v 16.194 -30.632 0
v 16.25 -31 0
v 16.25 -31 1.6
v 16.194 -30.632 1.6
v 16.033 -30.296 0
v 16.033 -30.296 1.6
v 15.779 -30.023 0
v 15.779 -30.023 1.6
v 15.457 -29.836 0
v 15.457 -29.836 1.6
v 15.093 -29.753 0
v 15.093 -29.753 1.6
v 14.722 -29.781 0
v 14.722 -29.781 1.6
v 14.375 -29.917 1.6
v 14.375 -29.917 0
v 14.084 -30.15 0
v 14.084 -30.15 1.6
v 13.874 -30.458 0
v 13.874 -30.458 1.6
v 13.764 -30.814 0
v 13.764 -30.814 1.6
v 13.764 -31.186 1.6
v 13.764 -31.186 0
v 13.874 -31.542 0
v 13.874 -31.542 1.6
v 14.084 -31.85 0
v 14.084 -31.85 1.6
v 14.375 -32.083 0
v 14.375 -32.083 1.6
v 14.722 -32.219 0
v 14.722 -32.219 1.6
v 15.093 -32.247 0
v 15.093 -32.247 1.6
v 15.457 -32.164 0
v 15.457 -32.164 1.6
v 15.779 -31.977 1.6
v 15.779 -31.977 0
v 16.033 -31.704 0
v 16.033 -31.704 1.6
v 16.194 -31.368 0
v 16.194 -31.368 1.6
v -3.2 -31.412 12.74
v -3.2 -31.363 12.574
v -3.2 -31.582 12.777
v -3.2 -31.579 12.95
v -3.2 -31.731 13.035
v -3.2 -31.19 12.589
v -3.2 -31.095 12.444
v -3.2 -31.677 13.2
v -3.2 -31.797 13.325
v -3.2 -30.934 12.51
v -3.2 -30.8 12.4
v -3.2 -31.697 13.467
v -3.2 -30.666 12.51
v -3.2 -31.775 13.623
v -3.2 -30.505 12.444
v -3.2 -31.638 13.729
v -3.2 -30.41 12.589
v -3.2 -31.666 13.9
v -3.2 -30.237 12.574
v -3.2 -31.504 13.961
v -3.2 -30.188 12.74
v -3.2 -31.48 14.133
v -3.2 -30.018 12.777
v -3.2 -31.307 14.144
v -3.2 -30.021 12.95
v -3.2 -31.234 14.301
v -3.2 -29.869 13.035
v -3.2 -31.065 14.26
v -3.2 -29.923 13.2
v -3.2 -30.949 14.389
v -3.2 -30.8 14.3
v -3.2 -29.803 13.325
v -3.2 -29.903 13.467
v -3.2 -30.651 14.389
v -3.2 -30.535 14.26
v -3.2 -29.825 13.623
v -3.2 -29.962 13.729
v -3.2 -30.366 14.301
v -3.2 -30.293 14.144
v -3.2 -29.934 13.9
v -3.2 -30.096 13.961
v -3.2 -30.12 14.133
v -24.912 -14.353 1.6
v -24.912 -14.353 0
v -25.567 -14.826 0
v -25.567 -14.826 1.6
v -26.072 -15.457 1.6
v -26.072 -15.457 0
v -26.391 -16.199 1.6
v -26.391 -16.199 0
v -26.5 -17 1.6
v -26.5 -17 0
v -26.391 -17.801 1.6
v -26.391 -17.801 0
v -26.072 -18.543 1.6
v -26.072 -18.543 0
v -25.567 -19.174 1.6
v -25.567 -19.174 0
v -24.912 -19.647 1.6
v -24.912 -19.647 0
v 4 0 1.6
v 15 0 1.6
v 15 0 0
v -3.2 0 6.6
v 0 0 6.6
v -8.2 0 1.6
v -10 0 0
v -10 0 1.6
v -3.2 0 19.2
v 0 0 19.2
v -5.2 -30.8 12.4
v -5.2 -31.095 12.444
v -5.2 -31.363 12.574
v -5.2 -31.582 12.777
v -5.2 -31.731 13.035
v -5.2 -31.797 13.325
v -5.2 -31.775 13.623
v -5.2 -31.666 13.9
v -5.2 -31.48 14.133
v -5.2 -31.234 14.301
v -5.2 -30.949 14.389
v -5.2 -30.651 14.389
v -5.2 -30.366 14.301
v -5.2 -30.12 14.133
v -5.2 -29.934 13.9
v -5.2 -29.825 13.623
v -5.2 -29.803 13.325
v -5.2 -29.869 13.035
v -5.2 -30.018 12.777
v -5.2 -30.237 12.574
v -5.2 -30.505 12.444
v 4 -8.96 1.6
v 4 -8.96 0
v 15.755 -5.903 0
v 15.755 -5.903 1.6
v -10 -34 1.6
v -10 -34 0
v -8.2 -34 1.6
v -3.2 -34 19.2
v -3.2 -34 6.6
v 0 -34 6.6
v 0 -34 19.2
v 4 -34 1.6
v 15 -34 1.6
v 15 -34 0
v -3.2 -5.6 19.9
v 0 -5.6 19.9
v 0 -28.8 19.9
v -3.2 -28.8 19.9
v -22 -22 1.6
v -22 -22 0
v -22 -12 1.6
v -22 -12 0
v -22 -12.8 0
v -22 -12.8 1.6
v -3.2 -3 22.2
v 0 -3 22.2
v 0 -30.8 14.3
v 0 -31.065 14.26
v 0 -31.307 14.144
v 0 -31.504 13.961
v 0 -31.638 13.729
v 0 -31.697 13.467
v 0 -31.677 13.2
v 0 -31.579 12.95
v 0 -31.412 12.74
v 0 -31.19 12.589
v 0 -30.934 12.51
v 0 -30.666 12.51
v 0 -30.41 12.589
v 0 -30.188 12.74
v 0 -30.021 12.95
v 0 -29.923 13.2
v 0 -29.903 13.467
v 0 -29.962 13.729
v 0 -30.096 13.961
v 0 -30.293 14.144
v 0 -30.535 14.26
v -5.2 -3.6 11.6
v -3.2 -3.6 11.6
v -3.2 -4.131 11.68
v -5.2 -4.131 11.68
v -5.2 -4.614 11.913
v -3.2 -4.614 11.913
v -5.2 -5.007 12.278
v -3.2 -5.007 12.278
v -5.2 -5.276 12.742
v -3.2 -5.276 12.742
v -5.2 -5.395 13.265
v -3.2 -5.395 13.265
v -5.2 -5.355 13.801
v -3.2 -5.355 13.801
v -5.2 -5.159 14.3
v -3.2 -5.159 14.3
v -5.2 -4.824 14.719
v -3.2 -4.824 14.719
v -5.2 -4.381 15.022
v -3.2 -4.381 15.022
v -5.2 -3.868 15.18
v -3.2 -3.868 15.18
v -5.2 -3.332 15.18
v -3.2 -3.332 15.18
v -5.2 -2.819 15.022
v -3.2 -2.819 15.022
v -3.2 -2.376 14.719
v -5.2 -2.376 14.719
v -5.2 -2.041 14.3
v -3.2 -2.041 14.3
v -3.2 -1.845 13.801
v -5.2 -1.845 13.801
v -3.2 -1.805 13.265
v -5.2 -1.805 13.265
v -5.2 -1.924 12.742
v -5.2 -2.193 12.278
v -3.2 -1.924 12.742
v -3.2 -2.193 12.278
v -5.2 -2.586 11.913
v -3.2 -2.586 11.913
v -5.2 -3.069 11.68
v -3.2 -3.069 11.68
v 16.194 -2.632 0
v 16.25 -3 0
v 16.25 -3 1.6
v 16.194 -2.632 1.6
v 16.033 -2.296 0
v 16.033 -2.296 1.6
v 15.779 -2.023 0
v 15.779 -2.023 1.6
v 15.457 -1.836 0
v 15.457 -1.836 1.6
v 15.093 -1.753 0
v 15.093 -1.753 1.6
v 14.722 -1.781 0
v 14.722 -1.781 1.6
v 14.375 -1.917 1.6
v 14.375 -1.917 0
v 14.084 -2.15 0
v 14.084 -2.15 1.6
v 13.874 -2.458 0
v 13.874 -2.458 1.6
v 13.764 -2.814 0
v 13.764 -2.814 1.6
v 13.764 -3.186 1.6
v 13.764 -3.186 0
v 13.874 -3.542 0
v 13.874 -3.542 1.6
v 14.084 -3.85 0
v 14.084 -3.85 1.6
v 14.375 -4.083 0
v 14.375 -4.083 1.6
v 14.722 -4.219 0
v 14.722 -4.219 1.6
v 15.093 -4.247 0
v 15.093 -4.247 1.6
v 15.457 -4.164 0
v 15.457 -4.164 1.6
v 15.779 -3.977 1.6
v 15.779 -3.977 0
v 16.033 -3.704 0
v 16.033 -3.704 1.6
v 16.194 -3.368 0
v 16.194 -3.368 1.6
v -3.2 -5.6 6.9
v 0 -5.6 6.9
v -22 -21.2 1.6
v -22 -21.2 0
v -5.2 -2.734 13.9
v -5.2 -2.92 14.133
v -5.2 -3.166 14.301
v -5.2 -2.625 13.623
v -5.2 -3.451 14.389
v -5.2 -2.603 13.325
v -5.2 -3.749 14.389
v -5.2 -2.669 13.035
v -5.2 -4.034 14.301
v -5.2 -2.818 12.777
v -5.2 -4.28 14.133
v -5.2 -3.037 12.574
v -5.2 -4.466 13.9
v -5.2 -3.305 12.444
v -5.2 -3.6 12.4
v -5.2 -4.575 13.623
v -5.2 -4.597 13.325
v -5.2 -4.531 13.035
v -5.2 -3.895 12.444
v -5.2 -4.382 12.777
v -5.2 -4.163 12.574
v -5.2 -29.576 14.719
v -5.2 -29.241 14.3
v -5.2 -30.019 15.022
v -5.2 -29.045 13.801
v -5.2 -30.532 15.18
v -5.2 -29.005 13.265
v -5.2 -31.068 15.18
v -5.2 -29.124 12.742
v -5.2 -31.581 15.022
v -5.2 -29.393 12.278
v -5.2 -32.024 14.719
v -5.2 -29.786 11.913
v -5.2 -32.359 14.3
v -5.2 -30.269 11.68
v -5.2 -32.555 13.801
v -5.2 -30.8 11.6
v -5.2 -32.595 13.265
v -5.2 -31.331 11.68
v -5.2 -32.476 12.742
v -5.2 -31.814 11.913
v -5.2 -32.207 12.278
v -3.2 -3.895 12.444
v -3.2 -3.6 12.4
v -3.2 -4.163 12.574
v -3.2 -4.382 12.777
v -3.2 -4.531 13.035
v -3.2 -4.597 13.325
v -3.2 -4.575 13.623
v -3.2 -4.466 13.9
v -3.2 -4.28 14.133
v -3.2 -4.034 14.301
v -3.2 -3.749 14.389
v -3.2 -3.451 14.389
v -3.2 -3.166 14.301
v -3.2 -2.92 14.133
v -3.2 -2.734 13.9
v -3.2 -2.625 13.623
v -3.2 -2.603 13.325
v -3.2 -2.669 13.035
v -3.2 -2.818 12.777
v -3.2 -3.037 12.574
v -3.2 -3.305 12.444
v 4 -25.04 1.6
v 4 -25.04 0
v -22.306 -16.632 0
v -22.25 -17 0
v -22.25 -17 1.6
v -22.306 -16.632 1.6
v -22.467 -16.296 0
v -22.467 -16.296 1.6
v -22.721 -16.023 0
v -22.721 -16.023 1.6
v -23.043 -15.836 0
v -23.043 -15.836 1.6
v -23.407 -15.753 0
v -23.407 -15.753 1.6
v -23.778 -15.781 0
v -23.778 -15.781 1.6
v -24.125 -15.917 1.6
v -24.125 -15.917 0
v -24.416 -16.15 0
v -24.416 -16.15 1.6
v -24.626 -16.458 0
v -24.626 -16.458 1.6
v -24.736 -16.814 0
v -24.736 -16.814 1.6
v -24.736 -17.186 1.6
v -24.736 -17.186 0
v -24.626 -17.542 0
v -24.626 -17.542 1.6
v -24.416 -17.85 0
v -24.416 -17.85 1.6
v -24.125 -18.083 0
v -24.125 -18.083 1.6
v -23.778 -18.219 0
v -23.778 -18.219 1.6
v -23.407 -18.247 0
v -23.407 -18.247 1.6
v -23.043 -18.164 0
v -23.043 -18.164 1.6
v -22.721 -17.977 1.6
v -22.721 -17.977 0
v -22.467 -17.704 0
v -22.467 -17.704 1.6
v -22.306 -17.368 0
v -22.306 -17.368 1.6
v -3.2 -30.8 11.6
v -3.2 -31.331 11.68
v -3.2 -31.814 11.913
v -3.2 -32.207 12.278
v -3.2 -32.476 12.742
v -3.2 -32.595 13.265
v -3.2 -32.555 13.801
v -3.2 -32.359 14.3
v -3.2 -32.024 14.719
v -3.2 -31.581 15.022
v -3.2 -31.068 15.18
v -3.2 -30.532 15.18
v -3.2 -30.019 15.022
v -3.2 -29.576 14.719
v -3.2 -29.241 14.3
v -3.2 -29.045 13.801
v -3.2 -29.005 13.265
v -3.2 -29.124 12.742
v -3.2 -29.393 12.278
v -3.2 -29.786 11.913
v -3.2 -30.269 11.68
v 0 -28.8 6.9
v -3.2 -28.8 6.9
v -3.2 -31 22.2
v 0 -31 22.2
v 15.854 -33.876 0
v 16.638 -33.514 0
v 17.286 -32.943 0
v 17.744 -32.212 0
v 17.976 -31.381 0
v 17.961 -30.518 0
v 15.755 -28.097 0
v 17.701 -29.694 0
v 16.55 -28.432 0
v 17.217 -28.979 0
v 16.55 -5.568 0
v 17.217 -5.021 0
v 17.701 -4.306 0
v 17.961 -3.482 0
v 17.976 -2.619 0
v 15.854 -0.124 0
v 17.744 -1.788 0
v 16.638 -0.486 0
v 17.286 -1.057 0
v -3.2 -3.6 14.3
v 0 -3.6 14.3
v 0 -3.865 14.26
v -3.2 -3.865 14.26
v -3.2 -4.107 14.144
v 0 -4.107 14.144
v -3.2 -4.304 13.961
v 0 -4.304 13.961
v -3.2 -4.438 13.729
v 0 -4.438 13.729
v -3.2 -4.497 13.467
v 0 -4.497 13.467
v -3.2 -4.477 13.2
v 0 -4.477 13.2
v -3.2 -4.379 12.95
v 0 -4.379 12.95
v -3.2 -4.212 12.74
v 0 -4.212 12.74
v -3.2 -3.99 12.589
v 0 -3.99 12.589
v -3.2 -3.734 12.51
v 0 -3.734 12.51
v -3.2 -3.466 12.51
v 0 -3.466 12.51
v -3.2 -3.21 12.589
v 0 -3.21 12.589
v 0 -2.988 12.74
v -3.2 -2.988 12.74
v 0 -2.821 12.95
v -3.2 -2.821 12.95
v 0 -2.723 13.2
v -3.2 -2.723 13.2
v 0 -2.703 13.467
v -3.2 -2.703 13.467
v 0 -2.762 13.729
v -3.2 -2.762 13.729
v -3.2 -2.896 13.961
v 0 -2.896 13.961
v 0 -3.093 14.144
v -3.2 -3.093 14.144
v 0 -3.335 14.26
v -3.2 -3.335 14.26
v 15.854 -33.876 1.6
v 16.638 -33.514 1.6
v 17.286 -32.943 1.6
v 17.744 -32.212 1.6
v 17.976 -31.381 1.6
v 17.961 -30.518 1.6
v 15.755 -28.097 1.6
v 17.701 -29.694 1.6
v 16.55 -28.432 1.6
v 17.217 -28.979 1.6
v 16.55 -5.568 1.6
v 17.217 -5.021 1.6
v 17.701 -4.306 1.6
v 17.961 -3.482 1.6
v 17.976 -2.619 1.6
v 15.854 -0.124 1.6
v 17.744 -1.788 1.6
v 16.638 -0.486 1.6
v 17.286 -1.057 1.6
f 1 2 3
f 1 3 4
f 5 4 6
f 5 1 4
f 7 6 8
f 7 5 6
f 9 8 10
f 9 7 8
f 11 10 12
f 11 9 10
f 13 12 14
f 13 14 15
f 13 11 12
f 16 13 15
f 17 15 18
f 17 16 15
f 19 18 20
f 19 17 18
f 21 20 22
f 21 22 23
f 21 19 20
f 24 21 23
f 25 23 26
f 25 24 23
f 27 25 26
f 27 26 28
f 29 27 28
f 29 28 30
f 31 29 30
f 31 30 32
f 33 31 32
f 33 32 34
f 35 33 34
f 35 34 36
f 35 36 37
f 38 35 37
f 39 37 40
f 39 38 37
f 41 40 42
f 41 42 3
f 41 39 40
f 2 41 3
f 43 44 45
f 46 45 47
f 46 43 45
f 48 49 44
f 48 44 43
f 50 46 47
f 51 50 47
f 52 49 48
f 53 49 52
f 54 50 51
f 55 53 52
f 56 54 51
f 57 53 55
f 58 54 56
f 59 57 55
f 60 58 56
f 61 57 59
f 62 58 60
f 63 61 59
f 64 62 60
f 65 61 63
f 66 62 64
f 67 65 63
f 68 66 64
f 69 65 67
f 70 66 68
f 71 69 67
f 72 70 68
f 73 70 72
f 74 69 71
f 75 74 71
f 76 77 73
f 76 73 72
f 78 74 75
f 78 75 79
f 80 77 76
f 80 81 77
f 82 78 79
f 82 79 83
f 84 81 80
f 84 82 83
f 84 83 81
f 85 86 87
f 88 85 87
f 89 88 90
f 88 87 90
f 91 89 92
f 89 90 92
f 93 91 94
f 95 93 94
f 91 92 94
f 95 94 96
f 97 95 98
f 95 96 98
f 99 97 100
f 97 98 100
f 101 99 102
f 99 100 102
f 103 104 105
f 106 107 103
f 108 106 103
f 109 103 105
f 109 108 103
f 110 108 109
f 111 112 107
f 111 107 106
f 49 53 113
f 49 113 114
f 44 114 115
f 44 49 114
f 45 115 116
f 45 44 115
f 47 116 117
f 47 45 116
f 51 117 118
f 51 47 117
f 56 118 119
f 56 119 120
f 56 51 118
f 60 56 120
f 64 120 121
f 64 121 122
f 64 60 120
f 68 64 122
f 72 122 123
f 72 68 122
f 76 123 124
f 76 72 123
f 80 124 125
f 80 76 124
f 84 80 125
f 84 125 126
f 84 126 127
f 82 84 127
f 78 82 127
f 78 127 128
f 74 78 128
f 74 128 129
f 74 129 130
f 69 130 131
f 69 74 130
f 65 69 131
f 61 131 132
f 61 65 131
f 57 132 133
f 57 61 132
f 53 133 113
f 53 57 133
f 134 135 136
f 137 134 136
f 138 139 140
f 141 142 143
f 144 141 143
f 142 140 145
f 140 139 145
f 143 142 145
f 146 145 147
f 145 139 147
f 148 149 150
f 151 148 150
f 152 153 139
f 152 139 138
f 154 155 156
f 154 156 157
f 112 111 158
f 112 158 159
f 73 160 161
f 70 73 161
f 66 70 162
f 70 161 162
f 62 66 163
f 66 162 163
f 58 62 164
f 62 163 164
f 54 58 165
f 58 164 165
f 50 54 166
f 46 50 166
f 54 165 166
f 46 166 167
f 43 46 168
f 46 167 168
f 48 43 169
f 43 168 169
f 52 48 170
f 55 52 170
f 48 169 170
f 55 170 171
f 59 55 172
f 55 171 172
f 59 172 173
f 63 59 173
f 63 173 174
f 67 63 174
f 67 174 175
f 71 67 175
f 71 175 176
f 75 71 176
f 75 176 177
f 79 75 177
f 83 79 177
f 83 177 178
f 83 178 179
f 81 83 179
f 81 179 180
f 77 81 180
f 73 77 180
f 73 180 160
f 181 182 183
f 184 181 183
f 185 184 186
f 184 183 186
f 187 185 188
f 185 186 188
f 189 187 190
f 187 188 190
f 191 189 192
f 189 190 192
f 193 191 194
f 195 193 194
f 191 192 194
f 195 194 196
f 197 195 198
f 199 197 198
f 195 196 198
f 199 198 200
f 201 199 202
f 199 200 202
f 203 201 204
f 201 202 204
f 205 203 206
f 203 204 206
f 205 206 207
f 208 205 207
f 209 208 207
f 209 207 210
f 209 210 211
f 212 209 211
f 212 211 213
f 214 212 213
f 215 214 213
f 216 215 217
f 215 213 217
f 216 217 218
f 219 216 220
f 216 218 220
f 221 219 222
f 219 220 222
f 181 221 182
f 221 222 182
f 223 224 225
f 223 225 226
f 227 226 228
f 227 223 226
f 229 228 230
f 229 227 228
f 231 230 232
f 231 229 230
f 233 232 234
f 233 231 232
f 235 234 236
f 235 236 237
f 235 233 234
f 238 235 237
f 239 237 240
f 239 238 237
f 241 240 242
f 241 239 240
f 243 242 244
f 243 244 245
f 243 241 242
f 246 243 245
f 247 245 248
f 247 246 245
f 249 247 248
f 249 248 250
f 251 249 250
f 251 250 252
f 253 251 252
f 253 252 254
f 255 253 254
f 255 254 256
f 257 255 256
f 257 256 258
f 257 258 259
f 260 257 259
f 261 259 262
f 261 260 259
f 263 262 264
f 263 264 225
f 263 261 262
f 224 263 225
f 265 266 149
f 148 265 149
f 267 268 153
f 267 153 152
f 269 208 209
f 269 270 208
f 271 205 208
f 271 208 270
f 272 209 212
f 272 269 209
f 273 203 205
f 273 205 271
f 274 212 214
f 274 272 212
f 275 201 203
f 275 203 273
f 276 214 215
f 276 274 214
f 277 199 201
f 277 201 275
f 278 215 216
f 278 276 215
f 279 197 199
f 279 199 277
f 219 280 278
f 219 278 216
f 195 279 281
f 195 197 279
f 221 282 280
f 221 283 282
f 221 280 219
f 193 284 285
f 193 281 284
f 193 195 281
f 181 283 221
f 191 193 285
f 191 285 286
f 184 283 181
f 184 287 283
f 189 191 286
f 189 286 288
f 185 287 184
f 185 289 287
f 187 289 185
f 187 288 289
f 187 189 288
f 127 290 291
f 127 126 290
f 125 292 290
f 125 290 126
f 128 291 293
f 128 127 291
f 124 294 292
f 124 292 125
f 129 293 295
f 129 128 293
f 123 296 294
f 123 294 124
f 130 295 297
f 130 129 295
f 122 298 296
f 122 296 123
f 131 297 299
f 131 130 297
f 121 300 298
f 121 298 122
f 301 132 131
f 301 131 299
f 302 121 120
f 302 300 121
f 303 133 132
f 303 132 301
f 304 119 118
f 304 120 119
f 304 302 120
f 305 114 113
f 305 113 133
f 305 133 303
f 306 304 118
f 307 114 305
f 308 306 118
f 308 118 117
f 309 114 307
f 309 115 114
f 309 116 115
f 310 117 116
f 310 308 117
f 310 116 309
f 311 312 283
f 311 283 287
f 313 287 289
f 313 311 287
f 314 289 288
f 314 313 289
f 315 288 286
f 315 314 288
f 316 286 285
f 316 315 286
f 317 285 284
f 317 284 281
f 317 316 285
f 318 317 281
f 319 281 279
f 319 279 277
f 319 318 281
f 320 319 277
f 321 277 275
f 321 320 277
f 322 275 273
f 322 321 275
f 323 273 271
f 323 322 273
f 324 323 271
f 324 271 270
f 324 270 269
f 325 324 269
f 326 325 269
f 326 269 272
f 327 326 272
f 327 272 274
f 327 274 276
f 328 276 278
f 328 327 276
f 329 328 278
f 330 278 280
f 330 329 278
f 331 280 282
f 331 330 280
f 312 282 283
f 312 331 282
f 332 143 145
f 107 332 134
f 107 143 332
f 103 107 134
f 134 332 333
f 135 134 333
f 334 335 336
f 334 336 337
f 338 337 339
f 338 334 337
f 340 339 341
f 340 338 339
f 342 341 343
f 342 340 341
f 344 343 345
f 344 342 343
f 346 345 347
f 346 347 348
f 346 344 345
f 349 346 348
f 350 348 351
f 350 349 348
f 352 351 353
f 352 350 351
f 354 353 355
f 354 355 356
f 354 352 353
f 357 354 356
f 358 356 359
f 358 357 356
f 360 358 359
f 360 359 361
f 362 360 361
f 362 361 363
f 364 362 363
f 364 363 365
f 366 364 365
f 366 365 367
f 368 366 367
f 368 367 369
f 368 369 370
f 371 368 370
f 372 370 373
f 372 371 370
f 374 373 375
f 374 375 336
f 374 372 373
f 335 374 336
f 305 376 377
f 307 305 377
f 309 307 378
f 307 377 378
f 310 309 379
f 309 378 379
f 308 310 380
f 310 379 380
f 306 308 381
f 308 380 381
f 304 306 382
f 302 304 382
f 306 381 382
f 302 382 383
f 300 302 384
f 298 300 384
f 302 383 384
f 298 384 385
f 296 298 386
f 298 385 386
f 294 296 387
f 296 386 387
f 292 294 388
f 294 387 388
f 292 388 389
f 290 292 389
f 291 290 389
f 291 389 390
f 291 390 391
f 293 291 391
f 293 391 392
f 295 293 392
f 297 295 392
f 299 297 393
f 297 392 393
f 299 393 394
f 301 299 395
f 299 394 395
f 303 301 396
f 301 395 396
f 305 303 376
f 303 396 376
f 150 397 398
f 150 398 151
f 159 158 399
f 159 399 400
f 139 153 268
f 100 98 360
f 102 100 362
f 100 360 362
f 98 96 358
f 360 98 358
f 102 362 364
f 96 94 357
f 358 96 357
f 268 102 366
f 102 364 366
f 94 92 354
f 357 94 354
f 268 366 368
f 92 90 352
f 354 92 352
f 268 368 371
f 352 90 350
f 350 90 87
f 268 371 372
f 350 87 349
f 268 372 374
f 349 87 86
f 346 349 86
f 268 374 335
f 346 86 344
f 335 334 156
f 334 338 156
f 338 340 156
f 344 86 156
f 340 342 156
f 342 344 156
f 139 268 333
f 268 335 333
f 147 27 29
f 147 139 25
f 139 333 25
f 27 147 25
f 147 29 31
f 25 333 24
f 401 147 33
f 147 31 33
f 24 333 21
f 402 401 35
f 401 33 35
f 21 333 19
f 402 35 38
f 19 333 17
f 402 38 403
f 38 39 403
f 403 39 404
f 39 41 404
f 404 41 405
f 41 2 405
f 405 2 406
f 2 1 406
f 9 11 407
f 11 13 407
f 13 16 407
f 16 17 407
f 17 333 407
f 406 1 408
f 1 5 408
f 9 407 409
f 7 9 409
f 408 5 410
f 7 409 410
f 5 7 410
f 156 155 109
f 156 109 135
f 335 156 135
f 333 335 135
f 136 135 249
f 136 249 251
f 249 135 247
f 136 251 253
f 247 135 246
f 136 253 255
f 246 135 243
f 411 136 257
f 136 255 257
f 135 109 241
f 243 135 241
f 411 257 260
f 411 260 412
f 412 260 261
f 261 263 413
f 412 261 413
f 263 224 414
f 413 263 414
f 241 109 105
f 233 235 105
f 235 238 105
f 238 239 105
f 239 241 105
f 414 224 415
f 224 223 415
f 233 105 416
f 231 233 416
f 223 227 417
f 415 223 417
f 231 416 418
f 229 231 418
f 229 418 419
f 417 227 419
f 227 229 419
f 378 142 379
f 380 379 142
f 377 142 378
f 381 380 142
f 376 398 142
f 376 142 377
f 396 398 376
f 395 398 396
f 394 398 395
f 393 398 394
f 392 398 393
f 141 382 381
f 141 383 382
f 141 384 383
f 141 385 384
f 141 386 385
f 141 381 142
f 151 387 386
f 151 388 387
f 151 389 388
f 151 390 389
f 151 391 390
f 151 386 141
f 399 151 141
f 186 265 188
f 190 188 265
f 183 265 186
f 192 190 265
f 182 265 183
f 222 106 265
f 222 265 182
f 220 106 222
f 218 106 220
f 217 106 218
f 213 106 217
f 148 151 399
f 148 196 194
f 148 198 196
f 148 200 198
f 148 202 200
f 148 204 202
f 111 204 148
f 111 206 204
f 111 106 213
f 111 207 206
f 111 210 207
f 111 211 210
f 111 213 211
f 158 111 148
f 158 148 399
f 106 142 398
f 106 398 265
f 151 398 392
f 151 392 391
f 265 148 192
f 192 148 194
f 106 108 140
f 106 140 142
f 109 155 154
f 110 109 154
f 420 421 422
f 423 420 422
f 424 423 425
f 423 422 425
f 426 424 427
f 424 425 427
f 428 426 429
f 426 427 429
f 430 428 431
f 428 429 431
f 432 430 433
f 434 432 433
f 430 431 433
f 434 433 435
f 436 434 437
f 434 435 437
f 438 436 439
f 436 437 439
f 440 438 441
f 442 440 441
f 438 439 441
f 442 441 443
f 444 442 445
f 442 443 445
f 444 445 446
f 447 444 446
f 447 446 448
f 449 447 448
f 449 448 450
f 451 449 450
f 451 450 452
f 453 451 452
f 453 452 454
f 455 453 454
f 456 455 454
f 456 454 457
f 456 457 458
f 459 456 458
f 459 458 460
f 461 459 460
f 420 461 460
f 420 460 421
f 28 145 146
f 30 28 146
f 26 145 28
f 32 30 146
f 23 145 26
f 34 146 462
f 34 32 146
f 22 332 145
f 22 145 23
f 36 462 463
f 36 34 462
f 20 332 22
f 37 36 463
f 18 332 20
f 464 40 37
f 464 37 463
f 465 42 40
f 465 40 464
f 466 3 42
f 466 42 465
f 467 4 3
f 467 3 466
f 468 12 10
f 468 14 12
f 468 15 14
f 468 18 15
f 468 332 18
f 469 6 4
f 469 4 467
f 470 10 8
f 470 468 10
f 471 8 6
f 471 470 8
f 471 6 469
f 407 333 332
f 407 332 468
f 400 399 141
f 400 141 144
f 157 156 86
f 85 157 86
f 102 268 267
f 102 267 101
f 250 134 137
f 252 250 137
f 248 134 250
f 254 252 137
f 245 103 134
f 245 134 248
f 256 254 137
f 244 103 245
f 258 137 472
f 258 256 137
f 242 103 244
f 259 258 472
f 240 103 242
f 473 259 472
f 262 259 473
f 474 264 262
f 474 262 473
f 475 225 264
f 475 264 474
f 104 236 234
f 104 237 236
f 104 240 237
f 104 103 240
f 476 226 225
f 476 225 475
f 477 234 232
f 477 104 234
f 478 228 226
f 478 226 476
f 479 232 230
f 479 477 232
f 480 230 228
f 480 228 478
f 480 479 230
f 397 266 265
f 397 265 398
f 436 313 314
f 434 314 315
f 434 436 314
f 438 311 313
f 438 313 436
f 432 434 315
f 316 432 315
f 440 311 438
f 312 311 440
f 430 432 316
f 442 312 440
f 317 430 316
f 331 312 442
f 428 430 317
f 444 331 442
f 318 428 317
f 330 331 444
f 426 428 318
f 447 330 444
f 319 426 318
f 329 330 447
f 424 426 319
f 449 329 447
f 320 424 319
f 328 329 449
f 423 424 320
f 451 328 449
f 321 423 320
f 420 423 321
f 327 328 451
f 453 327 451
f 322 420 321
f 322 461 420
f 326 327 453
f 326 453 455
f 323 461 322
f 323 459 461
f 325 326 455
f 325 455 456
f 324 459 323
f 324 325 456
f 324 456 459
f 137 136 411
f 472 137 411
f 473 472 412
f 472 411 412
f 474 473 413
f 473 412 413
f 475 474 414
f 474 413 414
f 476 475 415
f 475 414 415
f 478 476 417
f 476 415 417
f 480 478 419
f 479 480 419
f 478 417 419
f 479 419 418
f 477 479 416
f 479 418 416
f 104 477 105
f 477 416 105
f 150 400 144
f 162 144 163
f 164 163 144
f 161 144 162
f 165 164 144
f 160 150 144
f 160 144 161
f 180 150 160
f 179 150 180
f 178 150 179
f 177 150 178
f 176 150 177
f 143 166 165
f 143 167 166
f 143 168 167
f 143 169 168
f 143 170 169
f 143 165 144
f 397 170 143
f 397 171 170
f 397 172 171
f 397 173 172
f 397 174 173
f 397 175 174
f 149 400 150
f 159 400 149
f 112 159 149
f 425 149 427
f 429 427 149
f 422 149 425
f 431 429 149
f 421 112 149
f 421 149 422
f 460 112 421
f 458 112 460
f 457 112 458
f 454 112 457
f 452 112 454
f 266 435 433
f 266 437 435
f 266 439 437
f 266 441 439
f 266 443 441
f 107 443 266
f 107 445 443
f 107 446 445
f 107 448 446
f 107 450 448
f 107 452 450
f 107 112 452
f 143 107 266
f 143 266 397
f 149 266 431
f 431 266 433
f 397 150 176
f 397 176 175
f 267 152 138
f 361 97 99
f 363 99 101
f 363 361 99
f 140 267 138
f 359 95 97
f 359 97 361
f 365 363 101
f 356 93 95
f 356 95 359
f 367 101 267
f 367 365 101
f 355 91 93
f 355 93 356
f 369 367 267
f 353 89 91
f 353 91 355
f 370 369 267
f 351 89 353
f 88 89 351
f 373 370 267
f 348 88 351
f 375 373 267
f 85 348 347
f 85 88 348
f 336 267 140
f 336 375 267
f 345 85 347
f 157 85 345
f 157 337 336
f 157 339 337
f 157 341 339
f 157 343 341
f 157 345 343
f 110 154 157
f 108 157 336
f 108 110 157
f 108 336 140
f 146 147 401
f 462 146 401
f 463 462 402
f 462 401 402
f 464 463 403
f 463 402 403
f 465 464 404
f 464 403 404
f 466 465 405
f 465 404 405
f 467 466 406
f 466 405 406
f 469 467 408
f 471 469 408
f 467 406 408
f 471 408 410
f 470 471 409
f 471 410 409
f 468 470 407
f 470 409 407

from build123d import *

# Parameters (mm, degrees)
PAD_DEPTH       = 34
SKETCH_R        = 0.9
POCKET_DEPTH    = 22.001
SKETCH003_W     = 13
SKETCH003_H     = 23.2
POCKET001_DEPTH = 22.001
SKETCH005_R     = 1.25
PAD001_DEPTH    = 1.6
SKETCH006_R     = 1.25
PAD002_DEPTH    = 1.6
SKETCH008_R     = 1.8
SKETCH008_R_2   = 1
PAD003_DEPTH    = 2
CHAMFER_SIZE    = 3
CHAMFER001_SIZE = 12


with BuildPart() as part:
    # Sketch001 → Pad (new body)
    with BuildSketch(Plane.XZ):
        Polygon((-22, 1.6), (-8.2, 1.6), (-3.2, 6.6), (-3.2, 22.2), (0, 22.2), (0, 6.6), (4, 1.6), (4, 0), (-3.601763, 0), (-22, 0), align=None)
    extrude(amount=PAD_DEPTH)

    # Sketch → Pocket (cut, through all)
    with BuildSketch(Plane(origin=(0, 0, 0), x_dir=(0, 0, 1), z_dir=(1, 0, 0))):
        with Locations((13.4, 30.8)):
            Circle(SKETCH_R)
        with Locations((13.4, 3.6)):
            Circle(SKETCH_R)
    extrude(amount=-POCKET_DEPTH, mode=Mode.SUBTRACT)

    # Sketch003 (on DatumPlane) → Pocket001 (cut, through all)
    with BuildSketch(Plane(origin=(0, 0, 0), x_dir=(0, 0, 1), z_dir=(1, 0, 0))):
        with Locations((13.4, 17.2)):
            Rectangle(SKETCH003_W, SKETCH003_H)
    extrude(amount=-POCKET001_DEPTH, mode=Mode.SUBTRACT)

    # Sketch005 → Pad001 (join)
    with BuildSketch(Plane.XY):
        with BuildLine():
            ThreePointArc((-24.911765, -14.352941), (-26.5, -17), (-24.911765, -19.647059))
            Line((-20.5, -22), (-24.911765, -19.647059))
            Line((-20.5, -12), (-20.5, -22))
            Line((-20.5, -12), (-24.911765, -14.352941))
        make_face()
        with Locations((-23.5, -17)):
            Circle(SKETCH005_R, mode=Mode.SUBTRACT)
    extrude(amount=PAD001_DEPTH)

    # Sketch006 → Pad002 (join)
    with BuildSketch(Plane.XY):
        with BuildLine():
            ThreePointArc((15, -34), (17.975766, -31.380547), (15.754946, -28.096544))
            Line((0, -24), (15.754946, -28.096544))
            Line((0, -34), (0, -24))
            Line((0, -34), (15, -34))
        make_face()
        with Locations((15, -31)):
            Circle(SKETCH006_R, mode=Mode.SUBTRACT)
        with BuildLine():
            ThreePointArc((15.754946, -5.903456), (17.975766, -2.619453), (15, 0))
            Line((0, 0), (15, 0))
            Line((0, 0), (0, -10))
            Line((0, -10), (15.754946, -5.903456))
        make_face()
        with Locations((15, -3)):
            Circle(SKETCH006_R, mode=Mode.SUBTRACT)
    extrude(amount=PAD002_DEPTH)

    # Sketch008 (on Face2 of Pad002) → Pad003 (join)
    with BuildSketch(Plane(origin=(-3.2, 0, 0), x_dir=(0, 0, -1), z_dir=(-1, 0, 0))):
        with Locations((-13.4, 30.8)):
            Circle(SKETCH008_R)
        with Locations((-13.4, 30.8)):
            Circle(SKETCH008_R_2, mode=Mode.SUBTRACT)
        with Locations((-13.4, 3.6)):
            Circle(SKETCH008_R)
        with Locations((-13.4, 3.6)):
            Circle(SKETCH008_R_2, mode=Mode.SUBTRACT)
    extrude(amount=PAD003_DEPTH)

    # Chamfer
    chamfer_edges = [part.edges().sort_by_distance(p)[0] for p in [
        (-1.6, -34, 22.2),
        (-1.6, 0, 22.2),
    ]]
    chamfer(chamfer_edges, length=CHAMFER_SIZE)

    # Chamfer001
    chamfer001_edges = [part.edges().sort_by_distance(p)[0] for p in [
        (-22, -34, 0.8),
        (-22, 0, 0.8),
    ]]
    chamfer(chamfer001_edges, length=CHAMFER001_SIZE)


solid = part.part
